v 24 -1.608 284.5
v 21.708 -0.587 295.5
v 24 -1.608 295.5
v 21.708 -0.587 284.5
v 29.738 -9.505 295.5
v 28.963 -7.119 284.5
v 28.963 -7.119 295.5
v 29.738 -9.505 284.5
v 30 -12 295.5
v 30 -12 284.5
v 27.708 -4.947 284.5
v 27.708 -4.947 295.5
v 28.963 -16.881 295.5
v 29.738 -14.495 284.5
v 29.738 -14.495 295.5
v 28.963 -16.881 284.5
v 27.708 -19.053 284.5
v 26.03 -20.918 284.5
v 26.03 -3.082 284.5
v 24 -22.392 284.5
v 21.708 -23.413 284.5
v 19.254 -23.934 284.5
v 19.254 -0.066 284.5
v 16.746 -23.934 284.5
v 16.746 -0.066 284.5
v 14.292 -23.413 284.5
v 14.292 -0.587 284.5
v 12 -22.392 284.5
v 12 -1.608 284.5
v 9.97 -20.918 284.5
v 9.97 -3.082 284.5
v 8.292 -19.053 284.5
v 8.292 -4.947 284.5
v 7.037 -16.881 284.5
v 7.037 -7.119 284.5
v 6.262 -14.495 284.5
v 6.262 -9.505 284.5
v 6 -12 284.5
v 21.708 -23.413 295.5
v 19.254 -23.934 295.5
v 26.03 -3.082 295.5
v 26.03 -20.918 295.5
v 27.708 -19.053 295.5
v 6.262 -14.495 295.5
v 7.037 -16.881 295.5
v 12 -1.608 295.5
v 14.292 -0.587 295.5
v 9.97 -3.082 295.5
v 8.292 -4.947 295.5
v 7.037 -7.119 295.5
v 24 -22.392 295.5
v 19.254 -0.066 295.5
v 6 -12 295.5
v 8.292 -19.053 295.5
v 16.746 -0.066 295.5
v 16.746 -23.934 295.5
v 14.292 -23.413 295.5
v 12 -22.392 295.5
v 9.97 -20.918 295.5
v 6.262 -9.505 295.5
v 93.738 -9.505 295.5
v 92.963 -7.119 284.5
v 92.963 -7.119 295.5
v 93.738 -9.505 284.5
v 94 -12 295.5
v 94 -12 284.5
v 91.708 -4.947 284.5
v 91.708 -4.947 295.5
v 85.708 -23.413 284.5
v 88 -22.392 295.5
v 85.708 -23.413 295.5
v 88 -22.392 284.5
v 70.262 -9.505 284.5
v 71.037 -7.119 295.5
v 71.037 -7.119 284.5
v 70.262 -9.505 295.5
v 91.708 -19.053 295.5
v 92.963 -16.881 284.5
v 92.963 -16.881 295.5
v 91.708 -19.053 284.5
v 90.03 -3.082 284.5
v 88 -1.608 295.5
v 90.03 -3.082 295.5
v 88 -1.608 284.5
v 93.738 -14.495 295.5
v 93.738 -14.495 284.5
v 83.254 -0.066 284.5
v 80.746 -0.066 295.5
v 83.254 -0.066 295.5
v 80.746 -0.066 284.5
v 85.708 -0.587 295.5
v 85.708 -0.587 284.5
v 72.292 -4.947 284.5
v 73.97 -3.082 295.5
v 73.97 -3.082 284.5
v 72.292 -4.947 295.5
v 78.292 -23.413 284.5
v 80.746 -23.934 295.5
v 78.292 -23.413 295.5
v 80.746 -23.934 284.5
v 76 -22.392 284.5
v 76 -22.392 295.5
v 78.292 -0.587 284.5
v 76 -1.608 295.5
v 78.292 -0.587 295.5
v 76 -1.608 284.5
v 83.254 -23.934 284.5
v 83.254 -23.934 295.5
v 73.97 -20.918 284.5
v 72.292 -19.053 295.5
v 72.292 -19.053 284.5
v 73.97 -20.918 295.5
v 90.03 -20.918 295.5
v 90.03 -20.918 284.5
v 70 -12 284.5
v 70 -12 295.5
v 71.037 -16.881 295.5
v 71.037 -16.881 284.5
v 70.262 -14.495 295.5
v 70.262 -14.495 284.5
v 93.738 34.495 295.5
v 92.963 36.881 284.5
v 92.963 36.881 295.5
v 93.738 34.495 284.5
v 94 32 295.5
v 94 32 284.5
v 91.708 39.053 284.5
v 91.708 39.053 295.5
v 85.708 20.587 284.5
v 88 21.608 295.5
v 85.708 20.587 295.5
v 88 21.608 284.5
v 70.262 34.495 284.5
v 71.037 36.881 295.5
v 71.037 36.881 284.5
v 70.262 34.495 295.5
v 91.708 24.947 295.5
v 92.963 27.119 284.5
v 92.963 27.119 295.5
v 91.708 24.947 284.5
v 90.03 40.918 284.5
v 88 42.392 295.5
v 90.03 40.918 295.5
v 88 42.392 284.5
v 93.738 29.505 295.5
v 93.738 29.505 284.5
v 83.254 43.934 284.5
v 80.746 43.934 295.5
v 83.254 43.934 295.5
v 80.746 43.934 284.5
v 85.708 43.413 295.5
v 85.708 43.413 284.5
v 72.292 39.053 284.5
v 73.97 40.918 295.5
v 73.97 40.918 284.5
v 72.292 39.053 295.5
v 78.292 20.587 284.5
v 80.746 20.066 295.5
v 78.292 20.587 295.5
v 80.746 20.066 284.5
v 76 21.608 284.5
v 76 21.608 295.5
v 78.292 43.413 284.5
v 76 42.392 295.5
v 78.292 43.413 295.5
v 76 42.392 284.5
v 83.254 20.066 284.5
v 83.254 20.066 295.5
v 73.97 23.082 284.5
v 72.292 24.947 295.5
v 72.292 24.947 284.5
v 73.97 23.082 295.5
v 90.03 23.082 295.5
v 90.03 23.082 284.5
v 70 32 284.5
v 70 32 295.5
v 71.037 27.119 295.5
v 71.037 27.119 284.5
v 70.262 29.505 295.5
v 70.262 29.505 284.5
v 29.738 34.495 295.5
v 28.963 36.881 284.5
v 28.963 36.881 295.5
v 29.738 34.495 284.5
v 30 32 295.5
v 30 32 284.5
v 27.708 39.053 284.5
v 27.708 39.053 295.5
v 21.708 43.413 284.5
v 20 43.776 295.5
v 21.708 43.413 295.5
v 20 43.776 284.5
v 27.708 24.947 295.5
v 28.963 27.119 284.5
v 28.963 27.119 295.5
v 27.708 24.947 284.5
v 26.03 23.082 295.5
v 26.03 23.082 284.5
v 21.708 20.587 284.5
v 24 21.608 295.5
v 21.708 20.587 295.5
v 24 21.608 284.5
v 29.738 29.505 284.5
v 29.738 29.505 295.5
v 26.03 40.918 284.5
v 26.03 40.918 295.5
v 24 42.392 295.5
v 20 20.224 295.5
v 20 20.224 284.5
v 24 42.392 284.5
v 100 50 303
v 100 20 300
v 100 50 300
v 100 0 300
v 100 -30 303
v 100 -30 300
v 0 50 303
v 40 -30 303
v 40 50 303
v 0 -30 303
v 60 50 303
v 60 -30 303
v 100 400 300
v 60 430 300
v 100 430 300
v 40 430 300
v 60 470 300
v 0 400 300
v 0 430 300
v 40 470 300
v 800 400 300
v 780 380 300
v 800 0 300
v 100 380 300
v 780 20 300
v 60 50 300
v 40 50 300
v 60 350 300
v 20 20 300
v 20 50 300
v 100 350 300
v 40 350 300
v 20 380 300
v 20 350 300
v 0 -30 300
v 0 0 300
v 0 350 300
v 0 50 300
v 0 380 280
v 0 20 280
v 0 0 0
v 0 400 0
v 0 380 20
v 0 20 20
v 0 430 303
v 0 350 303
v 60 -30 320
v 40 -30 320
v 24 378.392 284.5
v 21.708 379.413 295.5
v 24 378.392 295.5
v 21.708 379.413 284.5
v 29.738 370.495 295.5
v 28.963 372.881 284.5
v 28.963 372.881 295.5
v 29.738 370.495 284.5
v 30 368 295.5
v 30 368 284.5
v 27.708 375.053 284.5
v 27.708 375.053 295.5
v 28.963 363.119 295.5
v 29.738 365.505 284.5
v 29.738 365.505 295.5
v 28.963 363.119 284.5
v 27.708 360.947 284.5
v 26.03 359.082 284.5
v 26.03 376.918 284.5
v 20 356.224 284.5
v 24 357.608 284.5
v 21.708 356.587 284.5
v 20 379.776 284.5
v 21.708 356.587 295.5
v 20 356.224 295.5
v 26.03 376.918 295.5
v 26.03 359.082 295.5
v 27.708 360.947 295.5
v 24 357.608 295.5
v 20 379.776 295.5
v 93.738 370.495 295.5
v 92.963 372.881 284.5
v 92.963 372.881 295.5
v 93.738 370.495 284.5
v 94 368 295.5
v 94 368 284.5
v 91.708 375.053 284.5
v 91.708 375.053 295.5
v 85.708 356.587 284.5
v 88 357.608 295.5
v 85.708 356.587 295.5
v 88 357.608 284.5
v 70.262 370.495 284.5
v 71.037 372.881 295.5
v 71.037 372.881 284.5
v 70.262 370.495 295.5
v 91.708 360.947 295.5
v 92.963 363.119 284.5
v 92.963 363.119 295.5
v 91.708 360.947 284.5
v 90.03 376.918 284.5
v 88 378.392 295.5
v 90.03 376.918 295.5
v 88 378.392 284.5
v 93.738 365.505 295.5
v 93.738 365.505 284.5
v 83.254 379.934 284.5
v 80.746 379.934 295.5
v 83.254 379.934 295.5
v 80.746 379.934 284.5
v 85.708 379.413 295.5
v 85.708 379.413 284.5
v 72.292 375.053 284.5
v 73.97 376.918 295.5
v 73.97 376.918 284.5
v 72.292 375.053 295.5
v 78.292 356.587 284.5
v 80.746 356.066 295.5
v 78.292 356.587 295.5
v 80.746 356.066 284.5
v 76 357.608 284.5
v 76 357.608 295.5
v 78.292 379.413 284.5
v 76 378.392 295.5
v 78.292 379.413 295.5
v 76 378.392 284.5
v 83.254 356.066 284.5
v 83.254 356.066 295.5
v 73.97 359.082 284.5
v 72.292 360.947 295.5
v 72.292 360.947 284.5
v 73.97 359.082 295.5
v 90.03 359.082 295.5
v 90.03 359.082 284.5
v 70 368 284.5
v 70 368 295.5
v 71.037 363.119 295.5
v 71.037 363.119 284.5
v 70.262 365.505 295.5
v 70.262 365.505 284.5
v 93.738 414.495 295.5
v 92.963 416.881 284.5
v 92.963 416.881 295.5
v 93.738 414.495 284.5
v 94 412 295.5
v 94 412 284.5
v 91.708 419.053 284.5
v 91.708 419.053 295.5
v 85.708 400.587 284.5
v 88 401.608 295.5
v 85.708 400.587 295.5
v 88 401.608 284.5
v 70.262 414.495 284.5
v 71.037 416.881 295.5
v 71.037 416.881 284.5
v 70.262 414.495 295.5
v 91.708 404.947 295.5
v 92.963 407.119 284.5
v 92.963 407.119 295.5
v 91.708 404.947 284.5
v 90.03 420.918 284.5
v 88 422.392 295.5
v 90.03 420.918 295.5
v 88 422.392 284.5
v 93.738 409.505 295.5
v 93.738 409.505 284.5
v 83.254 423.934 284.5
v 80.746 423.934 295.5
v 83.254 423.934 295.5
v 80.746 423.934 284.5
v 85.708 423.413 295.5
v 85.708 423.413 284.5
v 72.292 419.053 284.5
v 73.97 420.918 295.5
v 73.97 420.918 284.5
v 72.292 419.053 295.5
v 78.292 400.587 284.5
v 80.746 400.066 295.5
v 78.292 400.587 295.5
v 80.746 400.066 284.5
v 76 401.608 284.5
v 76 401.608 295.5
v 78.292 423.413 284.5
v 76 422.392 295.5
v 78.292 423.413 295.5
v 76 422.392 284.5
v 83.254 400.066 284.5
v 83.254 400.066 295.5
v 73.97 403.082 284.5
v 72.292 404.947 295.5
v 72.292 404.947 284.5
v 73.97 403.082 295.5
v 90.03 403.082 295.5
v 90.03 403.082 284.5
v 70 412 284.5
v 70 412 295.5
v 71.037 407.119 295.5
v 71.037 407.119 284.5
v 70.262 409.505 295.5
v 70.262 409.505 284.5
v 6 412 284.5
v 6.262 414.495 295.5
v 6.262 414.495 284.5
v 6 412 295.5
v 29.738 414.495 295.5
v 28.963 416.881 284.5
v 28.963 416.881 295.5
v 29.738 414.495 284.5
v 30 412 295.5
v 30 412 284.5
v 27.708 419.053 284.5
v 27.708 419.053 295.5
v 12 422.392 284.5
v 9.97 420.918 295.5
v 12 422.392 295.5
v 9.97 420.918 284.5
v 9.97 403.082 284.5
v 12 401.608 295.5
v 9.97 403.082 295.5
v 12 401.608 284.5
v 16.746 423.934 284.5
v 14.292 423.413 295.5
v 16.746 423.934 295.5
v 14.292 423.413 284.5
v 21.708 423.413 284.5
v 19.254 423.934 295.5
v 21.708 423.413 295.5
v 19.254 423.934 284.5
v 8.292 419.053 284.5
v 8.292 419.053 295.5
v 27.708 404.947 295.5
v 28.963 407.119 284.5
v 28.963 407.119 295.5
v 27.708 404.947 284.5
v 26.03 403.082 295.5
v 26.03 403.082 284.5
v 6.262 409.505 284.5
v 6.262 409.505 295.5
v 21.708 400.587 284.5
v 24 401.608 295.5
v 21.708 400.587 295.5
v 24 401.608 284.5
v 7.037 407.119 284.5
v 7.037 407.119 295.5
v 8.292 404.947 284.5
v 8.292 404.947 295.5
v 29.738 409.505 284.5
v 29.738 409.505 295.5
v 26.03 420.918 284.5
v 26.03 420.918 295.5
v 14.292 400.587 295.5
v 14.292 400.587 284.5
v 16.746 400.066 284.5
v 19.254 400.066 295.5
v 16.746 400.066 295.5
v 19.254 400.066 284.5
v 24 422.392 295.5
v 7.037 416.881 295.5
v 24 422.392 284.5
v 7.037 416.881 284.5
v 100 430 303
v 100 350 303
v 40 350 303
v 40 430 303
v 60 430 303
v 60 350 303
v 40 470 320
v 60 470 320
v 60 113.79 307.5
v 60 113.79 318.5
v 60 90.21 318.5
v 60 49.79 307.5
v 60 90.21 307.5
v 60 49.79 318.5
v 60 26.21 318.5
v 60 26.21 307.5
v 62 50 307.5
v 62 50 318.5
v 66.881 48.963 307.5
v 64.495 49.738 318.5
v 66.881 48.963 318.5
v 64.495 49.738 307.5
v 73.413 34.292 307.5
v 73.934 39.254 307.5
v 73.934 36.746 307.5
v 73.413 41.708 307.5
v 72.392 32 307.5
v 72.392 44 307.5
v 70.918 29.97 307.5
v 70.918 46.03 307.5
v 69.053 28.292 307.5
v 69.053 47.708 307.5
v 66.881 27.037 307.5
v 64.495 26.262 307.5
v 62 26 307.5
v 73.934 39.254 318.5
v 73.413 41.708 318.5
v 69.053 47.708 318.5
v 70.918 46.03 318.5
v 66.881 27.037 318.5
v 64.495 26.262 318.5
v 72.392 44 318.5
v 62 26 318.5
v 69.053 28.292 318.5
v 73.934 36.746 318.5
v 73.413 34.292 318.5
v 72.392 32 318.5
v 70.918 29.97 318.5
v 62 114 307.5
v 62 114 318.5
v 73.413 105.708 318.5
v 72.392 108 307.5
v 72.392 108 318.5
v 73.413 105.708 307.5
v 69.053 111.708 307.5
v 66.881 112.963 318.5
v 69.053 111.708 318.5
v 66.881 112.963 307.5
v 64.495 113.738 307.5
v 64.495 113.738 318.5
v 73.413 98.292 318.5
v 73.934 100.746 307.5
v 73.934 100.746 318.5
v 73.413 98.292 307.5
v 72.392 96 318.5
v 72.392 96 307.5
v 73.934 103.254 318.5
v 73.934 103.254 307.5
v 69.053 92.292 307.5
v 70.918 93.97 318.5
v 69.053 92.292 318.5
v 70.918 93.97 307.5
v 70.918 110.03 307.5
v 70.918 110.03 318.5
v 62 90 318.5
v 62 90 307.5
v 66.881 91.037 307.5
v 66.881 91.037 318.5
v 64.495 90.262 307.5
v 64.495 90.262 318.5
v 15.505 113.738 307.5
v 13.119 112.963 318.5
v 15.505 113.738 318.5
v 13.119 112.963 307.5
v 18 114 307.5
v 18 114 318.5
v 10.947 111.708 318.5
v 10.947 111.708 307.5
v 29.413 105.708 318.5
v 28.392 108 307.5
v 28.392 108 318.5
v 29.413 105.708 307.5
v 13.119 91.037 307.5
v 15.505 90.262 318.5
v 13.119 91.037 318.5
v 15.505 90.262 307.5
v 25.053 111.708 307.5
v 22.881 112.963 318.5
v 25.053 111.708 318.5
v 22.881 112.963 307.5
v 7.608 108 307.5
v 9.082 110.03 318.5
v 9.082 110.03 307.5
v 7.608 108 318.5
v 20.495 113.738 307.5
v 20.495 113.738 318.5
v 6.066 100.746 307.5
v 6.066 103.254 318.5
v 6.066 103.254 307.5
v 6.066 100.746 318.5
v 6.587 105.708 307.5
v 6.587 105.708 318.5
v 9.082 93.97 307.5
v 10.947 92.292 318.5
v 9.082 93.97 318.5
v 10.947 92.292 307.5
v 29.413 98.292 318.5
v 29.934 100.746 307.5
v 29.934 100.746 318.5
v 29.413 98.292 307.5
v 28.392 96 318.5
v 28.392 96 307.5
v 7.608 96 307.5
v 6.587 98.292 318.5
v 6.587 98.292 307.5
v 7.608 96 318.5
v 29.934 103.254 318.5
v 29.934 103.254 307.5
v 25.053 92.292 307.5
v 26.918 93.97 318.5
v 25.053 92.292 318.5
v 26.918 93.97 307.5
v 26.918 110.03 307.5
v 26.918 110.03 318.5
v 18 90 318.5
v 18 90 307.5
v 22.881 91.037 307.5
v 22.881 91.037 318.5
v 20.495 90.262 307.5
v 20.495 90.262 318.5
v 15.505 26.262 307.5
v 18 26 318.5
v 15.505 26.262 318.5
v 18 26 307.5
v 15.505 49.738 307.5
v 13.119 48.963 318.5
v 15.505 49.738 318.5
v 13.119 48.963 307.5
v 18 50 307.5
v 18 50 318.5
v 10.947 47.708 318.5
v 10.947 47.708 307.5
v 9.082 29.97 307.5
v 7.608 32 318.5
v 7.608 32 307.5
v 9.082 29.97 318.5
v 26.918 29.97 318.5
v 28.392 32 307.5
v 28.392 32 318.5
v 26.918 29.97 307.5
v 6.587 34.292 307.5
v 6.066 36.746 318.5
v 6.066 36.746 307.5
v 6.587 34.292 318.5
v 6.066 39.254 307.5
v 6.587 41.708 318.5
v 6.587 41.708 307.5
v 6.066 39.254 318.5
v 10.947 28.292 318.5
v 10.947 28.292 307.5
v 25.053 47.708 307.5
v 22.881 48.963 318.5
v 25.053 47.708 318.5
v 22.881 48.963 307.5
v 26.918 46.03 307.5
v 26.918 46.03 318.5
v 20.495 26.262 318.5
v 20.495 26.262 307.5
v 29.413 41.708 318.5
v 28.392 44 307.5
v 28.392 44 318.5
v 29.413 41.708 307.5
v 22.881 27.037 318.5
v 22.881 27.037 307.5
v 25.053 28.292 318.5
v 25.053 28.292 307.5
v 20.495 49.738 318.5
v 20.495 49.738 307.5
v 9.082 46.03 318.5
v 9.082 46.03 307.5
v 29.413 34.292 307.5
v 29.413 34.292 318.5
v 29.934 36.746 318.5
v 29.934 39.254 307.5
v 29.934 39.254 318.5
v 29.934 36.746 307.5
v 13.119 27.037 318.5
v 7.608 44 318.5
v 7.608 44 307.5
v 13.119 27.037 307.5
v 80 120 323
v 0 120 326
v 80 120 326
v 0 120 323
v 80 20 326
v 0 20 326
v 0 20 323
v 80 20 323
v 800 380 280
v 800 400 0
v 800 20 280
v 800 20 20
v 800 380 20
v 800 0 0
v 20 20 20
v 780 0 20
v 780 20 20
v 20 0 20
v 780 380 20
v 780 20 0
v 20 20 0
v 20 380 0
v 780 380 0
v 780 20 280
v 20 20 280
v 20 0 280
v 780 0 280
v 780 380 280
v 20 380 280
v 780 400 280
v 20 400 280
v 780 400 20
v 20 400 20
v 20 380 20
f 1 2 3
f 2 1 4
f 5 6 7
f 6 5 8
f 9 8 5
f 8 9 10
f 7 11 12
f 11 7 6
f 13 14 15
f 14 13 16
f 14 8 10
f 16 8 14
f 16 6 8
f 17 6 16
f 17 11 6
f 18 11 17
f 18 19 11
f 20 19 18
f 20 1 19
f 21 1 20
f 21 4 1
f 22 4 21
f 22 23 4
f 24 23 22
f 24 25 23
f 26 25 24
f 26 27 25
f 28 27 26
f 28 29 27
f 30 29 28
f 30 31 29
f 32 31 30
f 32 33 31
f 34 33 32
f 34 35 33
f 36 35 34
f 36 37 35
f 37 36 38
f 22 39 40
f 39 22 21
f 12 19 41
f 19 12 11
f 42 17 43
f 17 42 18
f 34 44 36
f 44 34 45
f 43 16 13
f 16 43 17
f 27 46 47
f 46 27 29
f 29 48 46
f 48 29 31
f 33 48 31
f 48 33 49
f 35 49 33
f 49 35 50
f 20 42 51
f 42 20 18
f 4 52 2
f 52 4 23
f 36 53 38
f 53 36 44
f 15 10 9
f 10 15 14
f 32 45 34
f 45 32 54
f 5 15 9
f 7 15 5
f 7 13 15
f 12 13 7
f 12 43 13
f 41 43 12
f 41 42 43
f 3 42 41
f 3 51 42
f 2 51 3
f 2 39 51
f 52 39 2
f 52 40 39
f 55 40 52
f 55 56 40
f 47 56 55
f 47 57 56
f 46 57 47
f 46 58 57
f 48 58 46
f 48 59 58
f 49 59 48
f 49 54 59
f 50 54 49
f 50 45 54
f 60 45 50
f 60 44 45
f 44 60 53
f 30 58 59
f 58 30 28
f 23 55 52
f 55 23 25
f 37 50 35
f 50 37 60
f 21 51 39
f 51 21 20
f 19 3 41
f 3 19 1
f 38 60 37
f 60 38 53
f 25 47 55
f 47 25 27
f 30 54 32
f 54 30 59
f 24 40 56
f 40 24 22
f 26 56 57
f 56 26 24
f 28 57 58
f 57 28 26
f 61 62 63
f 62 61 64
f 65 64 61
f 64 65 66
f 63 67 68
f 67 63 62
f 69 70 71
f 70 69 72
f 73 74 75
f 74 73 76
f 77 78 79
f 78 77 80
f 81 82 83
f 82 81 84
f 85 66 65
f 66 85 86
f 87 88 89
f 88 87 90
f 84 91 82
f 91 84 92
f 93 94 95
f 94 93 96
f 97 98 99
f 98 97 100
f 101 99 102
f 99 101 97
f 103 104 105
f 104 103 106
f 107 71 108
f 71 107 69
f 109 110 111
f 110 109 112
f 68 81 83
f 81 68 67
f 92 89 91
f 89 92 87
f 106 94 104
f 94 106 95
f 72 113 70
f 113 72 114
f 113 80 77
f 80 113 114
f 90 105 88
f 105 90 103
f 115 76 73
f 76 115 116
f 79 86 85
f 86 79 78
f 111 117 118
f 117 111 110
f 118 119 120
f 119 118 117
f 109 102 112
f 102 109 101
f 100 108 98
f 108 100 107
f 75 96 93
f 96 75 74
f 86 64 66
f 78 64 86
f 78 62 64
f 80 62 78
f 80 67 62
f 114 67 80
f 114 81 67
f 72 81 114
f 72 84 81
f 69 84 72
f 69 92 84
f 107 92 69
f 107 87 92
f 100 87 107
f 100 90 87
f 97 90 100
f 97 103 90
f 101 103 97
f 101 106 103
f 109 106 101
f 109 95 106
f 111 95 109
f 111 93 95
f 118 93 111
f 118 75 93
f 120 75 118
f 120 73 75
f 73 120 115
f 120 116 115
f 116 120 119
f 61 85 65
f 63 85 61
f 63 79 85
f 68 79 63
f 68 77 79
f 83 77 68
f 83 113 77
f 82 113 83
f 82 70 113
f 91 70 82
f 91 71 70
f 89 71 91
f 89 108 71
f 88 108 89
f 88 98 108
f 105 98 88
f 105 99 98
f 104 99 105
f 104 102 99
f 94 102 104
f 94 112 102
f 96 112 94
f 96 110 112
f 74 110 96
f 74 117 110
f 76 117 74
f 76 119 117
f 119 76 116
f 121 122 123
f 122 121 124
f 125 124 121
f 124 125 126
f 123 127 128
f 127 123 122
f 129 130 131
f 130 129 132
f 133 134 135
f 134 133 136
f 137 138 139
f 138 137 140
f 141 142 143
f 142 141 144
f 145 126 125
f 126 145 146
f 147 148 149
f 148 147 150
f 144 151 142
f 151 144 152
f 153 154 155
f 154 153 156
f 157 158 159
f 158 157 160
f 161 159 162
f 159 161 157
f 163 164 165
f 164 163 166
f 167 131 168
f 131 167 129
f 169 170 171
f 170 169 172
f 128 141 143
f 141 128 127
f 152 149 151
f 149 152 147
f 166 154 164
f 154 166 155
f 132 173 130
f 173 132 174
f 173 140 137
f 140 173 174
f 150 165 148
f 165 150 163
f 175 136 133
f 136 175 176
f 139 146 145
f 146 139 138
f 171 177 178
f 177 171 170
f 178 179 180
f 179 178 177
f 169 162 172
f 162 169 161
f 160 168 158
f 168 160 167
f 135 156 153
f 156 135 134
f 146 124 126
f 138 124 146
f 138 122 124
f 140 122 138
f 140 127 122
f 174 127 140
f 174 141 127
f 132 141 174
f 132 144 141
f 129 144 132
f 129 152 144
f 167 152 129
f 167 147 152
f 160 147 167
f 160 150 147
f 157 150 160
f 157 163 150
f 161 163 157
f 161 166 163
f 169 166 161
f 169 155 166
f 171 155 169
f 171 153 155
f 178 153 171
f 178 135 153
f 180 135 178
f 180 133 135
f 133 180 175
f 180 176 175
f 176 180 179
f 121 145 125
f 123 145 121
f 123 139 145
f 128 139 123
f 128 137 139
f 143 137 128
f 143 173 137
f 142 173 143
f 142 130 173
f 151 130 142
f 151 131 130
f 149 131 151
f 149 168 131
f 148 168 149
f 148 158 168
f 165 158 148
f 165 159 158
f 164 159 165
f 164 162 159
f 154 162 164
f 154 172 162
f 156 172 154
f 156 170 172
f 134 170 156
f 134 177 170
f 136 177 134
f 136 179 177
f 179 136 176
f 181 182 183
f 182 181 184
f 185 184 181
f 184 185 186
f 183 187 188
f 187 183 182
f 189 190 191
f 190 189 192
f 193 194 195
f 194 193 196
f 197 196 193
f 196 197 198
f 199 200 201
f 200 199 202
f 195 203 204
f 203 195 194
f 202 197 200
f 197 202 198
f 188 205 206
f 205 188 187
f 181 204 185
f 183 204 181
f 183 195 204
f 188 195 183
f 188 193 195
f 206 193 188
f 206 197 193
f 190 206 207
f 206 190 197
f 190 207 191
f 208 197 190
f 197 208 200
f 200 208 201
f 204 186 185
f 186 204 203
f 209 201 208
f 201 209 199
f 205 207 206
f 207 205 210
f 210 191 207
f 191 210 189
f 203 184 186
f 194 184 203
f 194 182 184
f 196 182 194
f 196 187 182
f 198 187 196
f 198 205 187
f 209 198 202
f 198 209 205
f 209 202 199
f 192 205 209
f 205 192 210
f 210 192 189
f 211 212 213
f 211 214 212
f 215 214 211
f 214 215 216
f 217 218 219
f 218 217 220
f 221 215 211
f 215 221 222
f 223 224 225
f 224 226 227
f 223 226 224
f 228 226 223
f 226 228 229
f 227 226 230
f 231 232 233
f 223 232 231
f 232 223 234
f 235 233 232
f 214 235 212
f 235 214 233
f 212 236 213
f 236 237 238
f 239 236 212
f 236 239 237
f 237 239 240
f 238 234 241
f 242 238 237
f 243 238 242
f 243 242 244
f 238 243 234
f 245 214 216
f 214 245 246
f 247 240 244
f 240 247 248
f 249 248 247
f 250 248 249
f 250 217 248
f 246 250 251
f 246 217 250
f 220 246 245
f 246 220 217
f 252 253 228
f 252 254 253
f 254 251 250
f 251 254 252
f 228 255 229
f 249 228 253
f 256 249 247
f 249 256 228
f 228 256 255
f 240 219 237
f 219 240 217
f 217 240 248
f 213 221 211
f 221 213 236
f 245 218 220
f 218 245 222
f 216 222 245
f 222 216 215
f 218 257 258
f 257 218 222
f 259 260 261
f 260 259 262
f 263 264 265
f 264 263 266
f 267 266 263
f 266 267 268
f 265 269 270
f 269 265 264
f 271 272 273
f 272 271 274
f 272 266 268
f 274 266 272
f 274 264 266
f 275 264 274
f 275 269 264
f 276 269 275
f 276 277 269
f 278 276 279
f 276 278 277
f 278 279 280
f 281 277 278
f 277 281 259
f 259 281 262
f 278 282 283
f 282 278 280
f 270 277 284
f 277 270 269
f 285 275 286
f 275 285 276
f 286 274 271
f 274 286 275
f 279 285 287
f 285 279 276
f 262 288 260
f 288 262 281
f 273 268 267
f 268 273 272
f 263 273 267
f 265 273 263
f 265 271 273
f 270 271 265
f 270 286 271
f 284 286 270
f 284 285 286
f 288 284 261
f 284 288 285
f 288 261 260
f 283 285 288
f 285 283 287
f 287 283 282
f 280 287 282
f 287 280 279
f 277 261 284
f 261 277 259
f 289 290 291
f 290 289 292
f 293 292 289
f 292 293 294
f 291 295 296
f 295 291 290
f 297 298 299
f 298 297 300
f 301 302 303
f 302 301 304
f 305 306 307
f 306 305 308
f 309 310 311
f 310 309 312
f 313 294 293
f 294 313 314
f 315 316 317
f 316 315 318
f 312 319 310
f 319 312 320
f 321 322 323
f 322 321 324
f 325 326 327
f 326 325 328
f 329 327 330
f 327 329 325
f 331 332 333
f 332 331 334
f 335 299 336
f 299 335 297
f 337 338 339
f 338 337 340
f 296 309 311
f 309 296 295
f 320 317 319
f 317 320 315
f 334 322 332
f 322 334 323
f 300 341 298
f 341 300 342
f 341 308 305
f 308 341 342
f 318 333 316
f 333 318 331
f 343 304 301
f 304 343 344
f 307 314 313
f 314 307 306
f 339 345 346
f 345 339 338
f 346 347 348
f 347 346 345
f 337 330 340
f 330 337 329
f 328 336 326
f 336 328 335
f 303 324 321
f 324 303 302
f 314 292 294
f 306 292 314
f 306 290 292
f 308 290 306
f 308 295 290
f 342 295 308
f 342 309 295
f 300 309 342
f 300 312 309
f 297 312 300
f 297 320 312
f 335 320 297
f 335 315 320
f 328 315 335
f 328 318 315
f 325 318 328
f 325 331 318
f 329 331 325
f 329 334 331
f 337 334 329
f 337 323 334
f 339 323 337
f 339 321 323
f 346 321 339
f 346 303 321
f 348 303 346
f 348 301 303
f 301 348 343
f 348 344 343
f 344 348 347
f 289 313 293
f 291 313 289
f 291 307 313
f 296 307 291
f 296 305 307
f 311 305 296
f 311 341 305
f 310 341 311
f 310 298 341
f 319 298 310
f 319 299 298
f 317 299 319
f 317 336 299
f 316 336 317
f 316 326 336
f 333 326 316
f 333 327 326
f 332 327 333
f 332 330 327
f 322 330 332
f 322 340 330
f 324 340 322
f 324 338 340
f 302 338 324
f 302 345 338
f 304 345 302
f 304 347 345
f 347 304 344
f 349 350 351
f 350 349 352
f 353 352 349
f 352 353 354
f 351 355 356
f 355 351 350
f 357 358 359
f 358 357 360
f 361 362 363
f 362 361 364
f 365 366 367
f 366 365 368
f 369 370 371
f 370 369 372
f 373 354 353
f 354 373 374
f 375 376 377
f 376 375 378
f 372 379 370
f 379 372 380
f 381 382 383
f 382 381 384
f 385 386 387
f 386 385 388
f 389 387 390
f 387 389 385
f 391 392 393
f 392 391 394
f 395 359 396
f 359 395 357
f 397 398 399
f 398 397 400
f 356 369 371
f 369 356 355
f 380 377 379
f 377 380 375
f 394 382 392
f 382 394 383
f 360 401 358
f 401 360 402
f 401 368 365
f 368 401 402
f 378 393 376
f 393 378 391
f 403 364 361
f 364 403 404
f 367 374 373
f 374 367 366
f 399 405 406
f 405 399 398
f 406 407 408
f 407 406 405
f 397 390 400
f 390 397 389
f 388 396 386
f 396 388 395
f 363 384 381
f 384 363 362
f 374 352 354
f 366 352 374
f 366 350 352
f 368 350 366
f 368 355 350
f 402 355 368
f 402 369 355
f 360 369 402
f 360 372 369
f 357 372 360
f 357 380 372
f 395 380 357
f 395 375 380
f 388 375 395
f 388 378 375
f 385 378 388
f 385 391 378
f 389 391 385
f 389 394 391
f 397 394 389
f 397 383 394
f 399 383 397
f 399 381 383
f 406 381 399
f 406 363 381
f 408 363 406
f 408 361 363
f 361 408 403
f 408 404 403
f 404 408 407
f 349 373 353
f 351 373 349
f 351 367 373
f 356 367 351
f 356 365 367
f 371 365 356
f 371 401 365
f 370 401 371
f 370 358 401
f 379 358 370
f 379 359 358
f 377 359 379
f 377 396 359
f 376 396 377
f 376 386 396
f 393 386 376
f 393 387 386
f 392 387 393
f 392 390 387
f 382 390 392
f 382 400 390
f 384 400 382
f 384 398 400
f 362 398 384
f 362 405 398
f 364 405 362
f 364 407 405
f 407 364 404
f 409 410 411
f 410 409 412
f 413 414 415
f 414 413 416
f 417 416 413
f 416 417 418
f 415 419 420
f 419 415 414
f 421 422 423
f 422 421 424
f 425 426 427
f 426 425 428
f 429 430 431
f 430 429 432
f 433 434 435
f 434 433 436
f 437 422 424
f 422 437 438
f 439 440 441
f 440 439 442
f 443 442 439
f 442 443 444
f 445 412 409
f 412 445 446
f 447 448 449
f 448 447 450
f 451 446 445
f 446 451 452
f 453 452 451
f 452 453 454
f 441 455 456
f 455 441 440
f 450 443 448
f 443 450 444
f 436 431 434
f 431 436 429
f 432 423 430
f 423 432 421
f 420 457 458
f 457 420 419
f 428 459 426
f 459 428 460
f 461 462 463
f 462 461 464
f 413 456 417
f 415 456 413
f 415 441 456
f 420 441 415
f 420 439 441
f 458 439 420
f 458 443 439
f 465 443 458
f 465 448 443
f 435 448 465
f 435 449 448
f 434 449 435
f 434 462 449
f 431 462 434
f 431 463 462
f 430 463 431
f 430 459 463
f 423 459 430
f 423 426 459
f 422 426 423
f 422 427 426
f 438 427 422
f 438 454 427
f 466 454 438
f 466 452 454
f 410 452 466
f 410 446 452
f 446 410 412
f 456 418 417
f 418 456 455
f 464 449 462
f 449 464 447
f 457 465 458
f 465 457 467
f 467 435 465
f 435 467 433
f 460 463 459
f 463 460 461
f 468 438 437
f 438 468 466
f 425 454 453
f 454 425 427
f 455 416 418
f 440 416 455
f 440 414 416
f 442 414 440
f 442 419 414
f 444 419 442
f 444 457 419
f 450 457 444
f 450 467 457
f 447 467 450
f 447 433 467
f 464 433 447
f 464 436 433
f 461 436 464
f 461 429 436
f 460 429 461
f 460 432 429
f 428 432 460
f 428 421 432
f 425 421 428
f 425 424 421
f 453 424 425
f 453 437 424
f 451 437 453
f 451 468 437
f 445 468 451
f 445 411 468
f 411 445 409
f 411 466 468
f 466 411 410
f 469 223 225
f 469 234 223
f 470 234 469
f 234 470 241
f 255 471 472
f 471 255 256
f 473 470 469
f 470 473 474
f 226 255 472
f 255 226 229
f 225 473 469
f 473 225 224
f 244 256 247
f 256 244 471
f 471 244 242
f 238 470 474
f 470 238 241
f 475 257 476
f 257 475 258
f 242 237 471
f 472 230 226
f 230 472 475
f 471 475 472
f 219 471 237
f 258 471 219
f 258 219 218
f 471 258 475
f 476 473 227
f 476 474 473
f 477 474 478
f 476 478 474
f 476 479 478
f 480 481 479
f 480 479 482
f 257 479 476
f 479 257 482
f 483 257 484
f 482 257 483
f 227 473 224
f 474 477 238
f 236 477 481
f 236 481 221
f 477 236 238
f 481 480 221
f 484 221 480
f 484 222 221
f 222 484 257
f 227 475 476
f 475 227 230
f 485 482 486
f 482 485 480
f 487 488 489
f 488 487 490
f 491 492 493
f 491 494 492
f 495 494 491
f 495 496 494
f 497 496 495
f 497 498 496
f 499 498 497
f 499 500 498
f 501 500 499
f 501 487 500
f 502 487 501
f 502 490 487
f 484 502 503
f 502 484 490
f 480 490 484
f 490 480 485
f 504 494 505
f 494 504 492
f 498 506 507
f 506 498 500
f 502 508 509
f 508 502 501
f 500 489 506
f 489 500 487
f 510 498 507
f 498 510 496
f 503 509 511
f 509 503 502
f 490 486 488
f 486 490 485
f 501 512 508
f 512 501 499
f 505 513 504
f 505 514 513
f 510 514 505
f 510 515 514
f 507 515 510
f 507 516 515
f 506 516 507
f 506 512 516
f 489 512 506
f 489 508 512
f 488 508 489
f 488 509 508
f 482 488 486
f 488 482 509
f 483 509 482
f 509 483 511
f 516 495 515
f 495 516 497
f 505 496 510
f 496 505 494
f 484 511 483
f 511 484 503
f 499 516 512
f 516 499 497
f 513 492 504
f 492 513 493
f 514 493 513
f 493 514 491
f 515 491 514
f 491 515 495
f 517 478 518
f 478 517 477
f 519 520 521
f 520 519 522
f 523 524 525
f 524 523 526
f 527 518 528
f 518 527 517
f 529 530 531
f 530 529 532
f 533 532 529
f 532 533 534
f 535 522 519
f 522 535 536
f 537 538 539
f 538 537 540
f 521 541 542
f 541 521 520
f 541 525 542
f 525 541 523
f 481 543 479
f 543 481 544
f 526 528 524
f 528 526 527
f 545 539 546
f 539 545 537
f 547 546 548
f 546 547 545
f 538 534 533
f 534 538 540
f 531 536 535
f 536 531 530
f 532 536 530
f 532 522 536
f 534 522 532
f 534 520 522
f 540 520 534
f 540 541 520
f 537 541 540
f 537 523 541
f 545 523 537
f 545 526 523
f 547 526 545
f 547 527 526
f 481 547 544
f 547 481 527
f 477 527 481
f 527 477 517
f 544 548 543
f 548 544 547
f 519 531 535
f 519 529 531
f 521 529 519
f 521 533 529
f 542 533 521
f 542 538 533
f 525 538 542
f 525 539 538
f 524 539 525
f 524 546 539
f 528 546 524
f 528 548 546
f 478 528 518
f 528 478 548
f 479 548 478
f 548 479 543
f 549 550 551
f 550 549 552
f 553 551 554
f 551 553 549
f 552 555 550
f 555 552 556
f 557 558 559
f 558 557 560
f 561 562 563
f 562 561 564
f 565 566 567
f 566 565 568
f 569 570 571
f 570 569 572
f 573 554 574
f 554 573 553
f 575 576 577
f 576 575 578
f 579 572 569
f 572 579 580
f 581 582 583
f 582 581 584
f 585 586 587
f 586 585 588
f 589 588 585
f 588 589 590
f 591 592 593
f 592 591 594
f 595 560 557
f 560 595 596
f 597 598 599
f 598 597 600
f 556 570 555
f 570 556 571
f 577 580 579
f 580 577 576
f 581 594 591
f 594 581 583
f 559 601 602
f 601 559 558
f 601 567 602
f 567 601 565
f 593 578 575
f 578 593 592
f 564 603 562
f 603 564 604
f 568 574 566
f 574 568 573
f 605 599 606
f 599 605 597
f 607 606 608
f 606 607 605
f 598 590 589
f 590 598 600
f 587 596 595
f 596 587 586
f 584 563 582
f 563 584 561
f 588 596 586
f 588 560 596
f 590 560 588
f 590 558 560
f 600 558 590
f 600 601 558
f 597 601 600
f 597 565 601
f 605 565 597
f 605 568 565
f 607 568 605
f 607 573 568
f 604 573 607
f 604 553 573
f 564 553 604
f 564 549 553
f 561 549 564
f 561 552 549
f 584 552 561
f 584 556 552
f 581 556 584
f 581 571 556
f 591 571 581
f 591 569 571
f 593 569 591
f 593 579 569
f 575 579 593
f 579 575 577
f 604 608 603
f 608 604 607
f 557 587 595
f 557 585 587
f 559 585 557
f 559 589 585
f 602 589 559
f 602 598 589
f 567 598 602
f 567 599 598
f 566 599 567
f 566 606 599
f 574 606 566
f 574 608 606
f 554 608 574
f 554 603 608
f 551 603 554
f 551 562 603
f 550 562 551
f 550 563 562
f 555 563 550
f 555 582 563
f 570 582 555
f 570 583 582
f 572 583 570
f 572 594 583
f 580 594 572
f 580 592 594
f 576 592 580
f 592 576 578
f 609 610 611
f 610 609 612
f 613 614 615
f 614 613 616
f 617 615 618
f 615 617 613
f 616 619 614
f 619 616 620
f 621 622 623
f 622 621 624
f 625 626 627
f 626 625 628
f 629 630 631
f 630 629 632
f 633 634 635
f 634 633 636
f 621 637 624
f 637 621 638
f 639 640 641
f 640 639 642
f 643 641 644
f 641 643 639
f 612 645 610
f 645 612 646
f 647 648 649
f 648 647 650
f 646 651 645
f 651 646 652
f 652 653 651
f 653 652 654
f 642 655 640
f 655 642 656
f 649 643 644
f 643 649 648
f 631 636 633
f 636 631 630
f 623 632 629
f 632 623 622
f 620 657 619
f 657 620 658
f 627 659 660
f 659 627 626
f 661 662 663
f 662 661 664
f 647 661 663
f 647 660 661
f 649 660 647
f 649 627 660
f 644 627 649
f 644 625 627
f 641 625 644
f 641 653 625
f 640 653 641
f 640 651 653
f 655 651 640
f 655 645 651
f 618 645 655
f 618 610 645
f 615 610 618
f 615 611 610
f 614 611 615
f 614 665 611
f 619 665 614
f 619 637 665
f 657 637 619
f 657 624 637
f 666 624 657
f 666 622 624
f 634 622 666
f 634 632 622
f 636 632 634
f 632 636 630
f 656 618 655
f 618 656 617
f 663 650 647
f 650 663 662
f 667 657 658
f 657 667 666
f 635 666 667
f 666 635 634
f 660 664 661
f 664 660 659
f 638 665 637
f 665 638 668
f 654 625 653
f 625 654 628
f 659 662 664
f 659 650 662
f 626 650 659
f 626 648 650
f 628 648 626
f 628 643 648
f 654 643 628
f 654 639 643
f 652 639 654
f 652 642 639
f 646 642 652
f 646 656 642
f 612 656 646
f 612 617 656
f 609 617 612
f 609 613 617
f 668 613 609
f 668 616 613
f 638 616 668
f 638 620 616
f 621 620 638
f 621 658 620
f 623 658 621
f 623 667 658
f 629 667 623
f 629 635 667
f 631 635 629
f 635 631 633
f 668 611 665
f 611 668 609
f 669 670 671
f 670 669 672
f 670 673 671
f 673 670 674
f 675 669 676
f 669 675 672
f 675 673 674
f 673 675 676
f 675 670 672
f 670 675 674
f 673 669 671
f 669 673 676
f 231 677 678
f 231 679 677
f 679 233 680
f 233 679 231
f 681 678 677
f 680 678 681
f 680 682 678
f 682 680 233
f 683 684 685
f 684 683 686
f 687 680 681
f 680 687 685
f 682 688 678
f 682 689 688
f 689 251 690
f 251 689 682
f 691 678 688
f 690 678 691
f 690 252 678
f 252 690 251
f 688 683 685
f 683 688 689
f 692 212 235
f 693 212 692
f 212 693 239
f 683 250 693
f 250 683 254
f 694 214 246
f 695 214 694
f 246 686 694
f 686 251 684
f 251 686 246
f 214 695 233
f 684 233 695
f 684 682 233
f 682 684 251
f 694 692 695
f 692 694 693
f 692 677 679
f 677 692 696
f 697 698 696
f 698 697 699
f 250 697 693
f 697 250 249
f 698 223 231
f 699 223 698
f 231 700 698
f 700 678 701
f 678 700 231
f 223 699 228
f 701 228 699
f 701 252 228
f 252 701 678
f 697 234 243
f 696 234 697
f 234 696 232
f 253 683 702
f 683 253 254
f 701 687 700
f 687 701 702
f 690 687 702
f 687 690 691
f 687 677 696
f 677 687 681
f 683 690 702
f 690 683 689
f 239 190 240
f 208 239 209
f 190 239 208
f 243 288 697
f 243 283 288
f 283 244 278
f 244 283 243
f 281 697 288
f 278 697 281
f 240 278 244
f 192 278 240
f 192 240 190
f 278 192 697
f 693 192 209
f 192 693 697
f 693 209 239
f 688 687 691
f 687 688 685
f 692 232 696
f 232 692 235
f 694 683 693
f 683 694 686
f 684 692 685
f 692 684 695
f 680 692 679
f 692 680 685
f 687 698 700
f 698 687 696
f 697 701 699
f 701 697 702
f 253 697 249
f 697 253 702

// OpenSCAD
// time varies fro 0 to 1 and 1 to 0
function position(time) = time < 0.5
      ? 50 + (time * 1372)
      : 50 + (1372/2 - ((time-0.5) * 1372)) ;



function pos_y_sup(time) = time < 0.5
      ? 60 + (time * 500)
      : 60 + (500/2 - ((time-0.5) * 500)) ;
union(){
    cube(size=[800, 20, 20]);
    translate(v=[0, 0, 280]){
        cube(size=[800, 20, 20]);
    };
    translate(v=[0, 380, 280]){
        cube(size=[800, 20, 20]);
    };
    translate(v=[0, 380, 0]){
        cube(size=[800, 20, 20]);
    };
    color("Orange"){
        translate(v=[20, 20, 0]){
            rotate(a=[0, 0, 90]){
                cube(size=[360, 20, 20]);
            };
        };
    };
    translate(v=[0, 0, 280]){
        color("Orange"){
            translate(v=[20, 20, 0]){
                rotate(a=[0, 0, 90]){
                    cube(size=[360, 20, 20]);
                };
            };
        };
    };
    translate(v=[780, 0, 0]){
        color("Orange"){
            translate(v=[20, 20, 0]){
                rotate(a=[0, 0, 90]){
                    cube(size=[360, 20, 20]);
                };
            };
        };
    };
    translate(v=[780, 0, 280]){
        color("Orange"){
            translate(v=[20, 20, 0]){
                rotate(a=[0, 0, 90]){
                    cube(size=[360, 20, 20]);
                };
            };
        };
    };
    color("Chartreuse"){
        translate(v=[20, 0, 20]){
            rotate(a=[0, -90, 0]){
                cube(size=[260, 20, 20]);
            };
        };
    };
    translate(v=[780, 0, 0]){
        color("Chartreuse"){
            translate(v=[20, 0, 20]){
                rotate(a=[0, -90, 0]){
                    cube(size=[260, 20, 20]);
                };
            };
        };
    };
    translate(v=[780, 380, 0]){
        color("Chartreuse"){
            translate(v=[20, 0, 20]){
                rotate(a=[0, -90, 0]){
                    cube(size=[260, 20, 20]);
                };
            };
        };
    };
    translate(v=[0, 380, 0]){
        color("Chartreuse"){
            translate(v=[20, 0, 20]){
                rotate(a=[0, -90, 0]){
                    cube(size=[260, 20, 20]);
                };
            };
        };
    };
    union(){
        translate(v=[position($t), 10, 300]){
            color("DarkOrange"){
                translate(v=[-50.0, -40.0, -20]){
                    union(){
                        translate(v=[0, 0, 20]){
                            cube(size=[100, 80, 3]);
                        };
                        translate(v=[18.0, 18.0, 4.5]){
                            union(){
                                cylinder(h=11, r=12);
                                translate(v=[64, 0, 0]){
                                    cylinder(h=11, r=12);
                                };
                                translate(v=[64, 44, 0]){
                                    cylinder(h=11, r=12);
                                };
                                translate(v=[0, 44, 0]){
                                    cylinder(h=11, r=12);
                                };
                            };
                        };
                    };
                };
            };
        }; // Y slider 1
        translate(v=[position($t), 390, 300]){
            color("DarkOrange"){
                translate(v=[-50.0, -40.0, -20]){
                    union(){
                        translate(v=[0, 0, 20]){
                            cube(size=[100, 80, 3]);
                        };
                        translate(v=[18.0, 18.0, 4.5]){
                            union(){
                                cylinder(h=11, r=12);
                                translate(v=[64, 0, 0]){
                                    cylinder(h=11, r=12);
                                };
                                translate(v=[64, 44, 0]){
                                    cylinder(h=11, r=12);
                                };
                                translate(v=[0, 44, 0]){
                                    cylinder(h=11, r=12);
                                };
                            };
                        };
                    };
                };
            };
        }; // Y slider 2
        translate(v=[position($t), -30, 300]){
            translate(v=[10, 0, 0]){
                color("Purple", 0.5){
                    rotate(a=[0, 0, 90]){
                        cube(size=[500, 20, 20]);
                    };
                };
            };
        }; // Y axis
    }; // End of AXIS_Y
    translate(v=[-10, pos_y_sup($t), 3]){
        union(){
            translate(v=[position($t), 10, 320]){
                color("LightBlue", 0.8){
                    rotate(a=[0, 0, 90]){
                        translate(v=[-50.0, -40.0, -20]){
                            union(){
                                translate(v=[0, 0, 20]){
                                    cube(size=[100, 80, 3]);
                                };
                                translate(v=[18.0, 18.0, 4.5]){
                                    union(){
                                        cylinder(h=11, r=12);
                                        translate(v=[64, 0, 0]){
                                            cylinder(h=11, r=12);
                                        };
                                        translate(v=[64, 44, 0]){
                                            cylinder(h=11, r=12);
                                        };
                                        translate(v=[0, 44, 0]){
                                            cylinder(h=11, r=12);
                                        };
                                    };
                                };
                            };
                        };
                    };
                };
            }; // slider 1
        };
    }; // End of AXIS_Y_SUP
}; // End of CARCASSE
